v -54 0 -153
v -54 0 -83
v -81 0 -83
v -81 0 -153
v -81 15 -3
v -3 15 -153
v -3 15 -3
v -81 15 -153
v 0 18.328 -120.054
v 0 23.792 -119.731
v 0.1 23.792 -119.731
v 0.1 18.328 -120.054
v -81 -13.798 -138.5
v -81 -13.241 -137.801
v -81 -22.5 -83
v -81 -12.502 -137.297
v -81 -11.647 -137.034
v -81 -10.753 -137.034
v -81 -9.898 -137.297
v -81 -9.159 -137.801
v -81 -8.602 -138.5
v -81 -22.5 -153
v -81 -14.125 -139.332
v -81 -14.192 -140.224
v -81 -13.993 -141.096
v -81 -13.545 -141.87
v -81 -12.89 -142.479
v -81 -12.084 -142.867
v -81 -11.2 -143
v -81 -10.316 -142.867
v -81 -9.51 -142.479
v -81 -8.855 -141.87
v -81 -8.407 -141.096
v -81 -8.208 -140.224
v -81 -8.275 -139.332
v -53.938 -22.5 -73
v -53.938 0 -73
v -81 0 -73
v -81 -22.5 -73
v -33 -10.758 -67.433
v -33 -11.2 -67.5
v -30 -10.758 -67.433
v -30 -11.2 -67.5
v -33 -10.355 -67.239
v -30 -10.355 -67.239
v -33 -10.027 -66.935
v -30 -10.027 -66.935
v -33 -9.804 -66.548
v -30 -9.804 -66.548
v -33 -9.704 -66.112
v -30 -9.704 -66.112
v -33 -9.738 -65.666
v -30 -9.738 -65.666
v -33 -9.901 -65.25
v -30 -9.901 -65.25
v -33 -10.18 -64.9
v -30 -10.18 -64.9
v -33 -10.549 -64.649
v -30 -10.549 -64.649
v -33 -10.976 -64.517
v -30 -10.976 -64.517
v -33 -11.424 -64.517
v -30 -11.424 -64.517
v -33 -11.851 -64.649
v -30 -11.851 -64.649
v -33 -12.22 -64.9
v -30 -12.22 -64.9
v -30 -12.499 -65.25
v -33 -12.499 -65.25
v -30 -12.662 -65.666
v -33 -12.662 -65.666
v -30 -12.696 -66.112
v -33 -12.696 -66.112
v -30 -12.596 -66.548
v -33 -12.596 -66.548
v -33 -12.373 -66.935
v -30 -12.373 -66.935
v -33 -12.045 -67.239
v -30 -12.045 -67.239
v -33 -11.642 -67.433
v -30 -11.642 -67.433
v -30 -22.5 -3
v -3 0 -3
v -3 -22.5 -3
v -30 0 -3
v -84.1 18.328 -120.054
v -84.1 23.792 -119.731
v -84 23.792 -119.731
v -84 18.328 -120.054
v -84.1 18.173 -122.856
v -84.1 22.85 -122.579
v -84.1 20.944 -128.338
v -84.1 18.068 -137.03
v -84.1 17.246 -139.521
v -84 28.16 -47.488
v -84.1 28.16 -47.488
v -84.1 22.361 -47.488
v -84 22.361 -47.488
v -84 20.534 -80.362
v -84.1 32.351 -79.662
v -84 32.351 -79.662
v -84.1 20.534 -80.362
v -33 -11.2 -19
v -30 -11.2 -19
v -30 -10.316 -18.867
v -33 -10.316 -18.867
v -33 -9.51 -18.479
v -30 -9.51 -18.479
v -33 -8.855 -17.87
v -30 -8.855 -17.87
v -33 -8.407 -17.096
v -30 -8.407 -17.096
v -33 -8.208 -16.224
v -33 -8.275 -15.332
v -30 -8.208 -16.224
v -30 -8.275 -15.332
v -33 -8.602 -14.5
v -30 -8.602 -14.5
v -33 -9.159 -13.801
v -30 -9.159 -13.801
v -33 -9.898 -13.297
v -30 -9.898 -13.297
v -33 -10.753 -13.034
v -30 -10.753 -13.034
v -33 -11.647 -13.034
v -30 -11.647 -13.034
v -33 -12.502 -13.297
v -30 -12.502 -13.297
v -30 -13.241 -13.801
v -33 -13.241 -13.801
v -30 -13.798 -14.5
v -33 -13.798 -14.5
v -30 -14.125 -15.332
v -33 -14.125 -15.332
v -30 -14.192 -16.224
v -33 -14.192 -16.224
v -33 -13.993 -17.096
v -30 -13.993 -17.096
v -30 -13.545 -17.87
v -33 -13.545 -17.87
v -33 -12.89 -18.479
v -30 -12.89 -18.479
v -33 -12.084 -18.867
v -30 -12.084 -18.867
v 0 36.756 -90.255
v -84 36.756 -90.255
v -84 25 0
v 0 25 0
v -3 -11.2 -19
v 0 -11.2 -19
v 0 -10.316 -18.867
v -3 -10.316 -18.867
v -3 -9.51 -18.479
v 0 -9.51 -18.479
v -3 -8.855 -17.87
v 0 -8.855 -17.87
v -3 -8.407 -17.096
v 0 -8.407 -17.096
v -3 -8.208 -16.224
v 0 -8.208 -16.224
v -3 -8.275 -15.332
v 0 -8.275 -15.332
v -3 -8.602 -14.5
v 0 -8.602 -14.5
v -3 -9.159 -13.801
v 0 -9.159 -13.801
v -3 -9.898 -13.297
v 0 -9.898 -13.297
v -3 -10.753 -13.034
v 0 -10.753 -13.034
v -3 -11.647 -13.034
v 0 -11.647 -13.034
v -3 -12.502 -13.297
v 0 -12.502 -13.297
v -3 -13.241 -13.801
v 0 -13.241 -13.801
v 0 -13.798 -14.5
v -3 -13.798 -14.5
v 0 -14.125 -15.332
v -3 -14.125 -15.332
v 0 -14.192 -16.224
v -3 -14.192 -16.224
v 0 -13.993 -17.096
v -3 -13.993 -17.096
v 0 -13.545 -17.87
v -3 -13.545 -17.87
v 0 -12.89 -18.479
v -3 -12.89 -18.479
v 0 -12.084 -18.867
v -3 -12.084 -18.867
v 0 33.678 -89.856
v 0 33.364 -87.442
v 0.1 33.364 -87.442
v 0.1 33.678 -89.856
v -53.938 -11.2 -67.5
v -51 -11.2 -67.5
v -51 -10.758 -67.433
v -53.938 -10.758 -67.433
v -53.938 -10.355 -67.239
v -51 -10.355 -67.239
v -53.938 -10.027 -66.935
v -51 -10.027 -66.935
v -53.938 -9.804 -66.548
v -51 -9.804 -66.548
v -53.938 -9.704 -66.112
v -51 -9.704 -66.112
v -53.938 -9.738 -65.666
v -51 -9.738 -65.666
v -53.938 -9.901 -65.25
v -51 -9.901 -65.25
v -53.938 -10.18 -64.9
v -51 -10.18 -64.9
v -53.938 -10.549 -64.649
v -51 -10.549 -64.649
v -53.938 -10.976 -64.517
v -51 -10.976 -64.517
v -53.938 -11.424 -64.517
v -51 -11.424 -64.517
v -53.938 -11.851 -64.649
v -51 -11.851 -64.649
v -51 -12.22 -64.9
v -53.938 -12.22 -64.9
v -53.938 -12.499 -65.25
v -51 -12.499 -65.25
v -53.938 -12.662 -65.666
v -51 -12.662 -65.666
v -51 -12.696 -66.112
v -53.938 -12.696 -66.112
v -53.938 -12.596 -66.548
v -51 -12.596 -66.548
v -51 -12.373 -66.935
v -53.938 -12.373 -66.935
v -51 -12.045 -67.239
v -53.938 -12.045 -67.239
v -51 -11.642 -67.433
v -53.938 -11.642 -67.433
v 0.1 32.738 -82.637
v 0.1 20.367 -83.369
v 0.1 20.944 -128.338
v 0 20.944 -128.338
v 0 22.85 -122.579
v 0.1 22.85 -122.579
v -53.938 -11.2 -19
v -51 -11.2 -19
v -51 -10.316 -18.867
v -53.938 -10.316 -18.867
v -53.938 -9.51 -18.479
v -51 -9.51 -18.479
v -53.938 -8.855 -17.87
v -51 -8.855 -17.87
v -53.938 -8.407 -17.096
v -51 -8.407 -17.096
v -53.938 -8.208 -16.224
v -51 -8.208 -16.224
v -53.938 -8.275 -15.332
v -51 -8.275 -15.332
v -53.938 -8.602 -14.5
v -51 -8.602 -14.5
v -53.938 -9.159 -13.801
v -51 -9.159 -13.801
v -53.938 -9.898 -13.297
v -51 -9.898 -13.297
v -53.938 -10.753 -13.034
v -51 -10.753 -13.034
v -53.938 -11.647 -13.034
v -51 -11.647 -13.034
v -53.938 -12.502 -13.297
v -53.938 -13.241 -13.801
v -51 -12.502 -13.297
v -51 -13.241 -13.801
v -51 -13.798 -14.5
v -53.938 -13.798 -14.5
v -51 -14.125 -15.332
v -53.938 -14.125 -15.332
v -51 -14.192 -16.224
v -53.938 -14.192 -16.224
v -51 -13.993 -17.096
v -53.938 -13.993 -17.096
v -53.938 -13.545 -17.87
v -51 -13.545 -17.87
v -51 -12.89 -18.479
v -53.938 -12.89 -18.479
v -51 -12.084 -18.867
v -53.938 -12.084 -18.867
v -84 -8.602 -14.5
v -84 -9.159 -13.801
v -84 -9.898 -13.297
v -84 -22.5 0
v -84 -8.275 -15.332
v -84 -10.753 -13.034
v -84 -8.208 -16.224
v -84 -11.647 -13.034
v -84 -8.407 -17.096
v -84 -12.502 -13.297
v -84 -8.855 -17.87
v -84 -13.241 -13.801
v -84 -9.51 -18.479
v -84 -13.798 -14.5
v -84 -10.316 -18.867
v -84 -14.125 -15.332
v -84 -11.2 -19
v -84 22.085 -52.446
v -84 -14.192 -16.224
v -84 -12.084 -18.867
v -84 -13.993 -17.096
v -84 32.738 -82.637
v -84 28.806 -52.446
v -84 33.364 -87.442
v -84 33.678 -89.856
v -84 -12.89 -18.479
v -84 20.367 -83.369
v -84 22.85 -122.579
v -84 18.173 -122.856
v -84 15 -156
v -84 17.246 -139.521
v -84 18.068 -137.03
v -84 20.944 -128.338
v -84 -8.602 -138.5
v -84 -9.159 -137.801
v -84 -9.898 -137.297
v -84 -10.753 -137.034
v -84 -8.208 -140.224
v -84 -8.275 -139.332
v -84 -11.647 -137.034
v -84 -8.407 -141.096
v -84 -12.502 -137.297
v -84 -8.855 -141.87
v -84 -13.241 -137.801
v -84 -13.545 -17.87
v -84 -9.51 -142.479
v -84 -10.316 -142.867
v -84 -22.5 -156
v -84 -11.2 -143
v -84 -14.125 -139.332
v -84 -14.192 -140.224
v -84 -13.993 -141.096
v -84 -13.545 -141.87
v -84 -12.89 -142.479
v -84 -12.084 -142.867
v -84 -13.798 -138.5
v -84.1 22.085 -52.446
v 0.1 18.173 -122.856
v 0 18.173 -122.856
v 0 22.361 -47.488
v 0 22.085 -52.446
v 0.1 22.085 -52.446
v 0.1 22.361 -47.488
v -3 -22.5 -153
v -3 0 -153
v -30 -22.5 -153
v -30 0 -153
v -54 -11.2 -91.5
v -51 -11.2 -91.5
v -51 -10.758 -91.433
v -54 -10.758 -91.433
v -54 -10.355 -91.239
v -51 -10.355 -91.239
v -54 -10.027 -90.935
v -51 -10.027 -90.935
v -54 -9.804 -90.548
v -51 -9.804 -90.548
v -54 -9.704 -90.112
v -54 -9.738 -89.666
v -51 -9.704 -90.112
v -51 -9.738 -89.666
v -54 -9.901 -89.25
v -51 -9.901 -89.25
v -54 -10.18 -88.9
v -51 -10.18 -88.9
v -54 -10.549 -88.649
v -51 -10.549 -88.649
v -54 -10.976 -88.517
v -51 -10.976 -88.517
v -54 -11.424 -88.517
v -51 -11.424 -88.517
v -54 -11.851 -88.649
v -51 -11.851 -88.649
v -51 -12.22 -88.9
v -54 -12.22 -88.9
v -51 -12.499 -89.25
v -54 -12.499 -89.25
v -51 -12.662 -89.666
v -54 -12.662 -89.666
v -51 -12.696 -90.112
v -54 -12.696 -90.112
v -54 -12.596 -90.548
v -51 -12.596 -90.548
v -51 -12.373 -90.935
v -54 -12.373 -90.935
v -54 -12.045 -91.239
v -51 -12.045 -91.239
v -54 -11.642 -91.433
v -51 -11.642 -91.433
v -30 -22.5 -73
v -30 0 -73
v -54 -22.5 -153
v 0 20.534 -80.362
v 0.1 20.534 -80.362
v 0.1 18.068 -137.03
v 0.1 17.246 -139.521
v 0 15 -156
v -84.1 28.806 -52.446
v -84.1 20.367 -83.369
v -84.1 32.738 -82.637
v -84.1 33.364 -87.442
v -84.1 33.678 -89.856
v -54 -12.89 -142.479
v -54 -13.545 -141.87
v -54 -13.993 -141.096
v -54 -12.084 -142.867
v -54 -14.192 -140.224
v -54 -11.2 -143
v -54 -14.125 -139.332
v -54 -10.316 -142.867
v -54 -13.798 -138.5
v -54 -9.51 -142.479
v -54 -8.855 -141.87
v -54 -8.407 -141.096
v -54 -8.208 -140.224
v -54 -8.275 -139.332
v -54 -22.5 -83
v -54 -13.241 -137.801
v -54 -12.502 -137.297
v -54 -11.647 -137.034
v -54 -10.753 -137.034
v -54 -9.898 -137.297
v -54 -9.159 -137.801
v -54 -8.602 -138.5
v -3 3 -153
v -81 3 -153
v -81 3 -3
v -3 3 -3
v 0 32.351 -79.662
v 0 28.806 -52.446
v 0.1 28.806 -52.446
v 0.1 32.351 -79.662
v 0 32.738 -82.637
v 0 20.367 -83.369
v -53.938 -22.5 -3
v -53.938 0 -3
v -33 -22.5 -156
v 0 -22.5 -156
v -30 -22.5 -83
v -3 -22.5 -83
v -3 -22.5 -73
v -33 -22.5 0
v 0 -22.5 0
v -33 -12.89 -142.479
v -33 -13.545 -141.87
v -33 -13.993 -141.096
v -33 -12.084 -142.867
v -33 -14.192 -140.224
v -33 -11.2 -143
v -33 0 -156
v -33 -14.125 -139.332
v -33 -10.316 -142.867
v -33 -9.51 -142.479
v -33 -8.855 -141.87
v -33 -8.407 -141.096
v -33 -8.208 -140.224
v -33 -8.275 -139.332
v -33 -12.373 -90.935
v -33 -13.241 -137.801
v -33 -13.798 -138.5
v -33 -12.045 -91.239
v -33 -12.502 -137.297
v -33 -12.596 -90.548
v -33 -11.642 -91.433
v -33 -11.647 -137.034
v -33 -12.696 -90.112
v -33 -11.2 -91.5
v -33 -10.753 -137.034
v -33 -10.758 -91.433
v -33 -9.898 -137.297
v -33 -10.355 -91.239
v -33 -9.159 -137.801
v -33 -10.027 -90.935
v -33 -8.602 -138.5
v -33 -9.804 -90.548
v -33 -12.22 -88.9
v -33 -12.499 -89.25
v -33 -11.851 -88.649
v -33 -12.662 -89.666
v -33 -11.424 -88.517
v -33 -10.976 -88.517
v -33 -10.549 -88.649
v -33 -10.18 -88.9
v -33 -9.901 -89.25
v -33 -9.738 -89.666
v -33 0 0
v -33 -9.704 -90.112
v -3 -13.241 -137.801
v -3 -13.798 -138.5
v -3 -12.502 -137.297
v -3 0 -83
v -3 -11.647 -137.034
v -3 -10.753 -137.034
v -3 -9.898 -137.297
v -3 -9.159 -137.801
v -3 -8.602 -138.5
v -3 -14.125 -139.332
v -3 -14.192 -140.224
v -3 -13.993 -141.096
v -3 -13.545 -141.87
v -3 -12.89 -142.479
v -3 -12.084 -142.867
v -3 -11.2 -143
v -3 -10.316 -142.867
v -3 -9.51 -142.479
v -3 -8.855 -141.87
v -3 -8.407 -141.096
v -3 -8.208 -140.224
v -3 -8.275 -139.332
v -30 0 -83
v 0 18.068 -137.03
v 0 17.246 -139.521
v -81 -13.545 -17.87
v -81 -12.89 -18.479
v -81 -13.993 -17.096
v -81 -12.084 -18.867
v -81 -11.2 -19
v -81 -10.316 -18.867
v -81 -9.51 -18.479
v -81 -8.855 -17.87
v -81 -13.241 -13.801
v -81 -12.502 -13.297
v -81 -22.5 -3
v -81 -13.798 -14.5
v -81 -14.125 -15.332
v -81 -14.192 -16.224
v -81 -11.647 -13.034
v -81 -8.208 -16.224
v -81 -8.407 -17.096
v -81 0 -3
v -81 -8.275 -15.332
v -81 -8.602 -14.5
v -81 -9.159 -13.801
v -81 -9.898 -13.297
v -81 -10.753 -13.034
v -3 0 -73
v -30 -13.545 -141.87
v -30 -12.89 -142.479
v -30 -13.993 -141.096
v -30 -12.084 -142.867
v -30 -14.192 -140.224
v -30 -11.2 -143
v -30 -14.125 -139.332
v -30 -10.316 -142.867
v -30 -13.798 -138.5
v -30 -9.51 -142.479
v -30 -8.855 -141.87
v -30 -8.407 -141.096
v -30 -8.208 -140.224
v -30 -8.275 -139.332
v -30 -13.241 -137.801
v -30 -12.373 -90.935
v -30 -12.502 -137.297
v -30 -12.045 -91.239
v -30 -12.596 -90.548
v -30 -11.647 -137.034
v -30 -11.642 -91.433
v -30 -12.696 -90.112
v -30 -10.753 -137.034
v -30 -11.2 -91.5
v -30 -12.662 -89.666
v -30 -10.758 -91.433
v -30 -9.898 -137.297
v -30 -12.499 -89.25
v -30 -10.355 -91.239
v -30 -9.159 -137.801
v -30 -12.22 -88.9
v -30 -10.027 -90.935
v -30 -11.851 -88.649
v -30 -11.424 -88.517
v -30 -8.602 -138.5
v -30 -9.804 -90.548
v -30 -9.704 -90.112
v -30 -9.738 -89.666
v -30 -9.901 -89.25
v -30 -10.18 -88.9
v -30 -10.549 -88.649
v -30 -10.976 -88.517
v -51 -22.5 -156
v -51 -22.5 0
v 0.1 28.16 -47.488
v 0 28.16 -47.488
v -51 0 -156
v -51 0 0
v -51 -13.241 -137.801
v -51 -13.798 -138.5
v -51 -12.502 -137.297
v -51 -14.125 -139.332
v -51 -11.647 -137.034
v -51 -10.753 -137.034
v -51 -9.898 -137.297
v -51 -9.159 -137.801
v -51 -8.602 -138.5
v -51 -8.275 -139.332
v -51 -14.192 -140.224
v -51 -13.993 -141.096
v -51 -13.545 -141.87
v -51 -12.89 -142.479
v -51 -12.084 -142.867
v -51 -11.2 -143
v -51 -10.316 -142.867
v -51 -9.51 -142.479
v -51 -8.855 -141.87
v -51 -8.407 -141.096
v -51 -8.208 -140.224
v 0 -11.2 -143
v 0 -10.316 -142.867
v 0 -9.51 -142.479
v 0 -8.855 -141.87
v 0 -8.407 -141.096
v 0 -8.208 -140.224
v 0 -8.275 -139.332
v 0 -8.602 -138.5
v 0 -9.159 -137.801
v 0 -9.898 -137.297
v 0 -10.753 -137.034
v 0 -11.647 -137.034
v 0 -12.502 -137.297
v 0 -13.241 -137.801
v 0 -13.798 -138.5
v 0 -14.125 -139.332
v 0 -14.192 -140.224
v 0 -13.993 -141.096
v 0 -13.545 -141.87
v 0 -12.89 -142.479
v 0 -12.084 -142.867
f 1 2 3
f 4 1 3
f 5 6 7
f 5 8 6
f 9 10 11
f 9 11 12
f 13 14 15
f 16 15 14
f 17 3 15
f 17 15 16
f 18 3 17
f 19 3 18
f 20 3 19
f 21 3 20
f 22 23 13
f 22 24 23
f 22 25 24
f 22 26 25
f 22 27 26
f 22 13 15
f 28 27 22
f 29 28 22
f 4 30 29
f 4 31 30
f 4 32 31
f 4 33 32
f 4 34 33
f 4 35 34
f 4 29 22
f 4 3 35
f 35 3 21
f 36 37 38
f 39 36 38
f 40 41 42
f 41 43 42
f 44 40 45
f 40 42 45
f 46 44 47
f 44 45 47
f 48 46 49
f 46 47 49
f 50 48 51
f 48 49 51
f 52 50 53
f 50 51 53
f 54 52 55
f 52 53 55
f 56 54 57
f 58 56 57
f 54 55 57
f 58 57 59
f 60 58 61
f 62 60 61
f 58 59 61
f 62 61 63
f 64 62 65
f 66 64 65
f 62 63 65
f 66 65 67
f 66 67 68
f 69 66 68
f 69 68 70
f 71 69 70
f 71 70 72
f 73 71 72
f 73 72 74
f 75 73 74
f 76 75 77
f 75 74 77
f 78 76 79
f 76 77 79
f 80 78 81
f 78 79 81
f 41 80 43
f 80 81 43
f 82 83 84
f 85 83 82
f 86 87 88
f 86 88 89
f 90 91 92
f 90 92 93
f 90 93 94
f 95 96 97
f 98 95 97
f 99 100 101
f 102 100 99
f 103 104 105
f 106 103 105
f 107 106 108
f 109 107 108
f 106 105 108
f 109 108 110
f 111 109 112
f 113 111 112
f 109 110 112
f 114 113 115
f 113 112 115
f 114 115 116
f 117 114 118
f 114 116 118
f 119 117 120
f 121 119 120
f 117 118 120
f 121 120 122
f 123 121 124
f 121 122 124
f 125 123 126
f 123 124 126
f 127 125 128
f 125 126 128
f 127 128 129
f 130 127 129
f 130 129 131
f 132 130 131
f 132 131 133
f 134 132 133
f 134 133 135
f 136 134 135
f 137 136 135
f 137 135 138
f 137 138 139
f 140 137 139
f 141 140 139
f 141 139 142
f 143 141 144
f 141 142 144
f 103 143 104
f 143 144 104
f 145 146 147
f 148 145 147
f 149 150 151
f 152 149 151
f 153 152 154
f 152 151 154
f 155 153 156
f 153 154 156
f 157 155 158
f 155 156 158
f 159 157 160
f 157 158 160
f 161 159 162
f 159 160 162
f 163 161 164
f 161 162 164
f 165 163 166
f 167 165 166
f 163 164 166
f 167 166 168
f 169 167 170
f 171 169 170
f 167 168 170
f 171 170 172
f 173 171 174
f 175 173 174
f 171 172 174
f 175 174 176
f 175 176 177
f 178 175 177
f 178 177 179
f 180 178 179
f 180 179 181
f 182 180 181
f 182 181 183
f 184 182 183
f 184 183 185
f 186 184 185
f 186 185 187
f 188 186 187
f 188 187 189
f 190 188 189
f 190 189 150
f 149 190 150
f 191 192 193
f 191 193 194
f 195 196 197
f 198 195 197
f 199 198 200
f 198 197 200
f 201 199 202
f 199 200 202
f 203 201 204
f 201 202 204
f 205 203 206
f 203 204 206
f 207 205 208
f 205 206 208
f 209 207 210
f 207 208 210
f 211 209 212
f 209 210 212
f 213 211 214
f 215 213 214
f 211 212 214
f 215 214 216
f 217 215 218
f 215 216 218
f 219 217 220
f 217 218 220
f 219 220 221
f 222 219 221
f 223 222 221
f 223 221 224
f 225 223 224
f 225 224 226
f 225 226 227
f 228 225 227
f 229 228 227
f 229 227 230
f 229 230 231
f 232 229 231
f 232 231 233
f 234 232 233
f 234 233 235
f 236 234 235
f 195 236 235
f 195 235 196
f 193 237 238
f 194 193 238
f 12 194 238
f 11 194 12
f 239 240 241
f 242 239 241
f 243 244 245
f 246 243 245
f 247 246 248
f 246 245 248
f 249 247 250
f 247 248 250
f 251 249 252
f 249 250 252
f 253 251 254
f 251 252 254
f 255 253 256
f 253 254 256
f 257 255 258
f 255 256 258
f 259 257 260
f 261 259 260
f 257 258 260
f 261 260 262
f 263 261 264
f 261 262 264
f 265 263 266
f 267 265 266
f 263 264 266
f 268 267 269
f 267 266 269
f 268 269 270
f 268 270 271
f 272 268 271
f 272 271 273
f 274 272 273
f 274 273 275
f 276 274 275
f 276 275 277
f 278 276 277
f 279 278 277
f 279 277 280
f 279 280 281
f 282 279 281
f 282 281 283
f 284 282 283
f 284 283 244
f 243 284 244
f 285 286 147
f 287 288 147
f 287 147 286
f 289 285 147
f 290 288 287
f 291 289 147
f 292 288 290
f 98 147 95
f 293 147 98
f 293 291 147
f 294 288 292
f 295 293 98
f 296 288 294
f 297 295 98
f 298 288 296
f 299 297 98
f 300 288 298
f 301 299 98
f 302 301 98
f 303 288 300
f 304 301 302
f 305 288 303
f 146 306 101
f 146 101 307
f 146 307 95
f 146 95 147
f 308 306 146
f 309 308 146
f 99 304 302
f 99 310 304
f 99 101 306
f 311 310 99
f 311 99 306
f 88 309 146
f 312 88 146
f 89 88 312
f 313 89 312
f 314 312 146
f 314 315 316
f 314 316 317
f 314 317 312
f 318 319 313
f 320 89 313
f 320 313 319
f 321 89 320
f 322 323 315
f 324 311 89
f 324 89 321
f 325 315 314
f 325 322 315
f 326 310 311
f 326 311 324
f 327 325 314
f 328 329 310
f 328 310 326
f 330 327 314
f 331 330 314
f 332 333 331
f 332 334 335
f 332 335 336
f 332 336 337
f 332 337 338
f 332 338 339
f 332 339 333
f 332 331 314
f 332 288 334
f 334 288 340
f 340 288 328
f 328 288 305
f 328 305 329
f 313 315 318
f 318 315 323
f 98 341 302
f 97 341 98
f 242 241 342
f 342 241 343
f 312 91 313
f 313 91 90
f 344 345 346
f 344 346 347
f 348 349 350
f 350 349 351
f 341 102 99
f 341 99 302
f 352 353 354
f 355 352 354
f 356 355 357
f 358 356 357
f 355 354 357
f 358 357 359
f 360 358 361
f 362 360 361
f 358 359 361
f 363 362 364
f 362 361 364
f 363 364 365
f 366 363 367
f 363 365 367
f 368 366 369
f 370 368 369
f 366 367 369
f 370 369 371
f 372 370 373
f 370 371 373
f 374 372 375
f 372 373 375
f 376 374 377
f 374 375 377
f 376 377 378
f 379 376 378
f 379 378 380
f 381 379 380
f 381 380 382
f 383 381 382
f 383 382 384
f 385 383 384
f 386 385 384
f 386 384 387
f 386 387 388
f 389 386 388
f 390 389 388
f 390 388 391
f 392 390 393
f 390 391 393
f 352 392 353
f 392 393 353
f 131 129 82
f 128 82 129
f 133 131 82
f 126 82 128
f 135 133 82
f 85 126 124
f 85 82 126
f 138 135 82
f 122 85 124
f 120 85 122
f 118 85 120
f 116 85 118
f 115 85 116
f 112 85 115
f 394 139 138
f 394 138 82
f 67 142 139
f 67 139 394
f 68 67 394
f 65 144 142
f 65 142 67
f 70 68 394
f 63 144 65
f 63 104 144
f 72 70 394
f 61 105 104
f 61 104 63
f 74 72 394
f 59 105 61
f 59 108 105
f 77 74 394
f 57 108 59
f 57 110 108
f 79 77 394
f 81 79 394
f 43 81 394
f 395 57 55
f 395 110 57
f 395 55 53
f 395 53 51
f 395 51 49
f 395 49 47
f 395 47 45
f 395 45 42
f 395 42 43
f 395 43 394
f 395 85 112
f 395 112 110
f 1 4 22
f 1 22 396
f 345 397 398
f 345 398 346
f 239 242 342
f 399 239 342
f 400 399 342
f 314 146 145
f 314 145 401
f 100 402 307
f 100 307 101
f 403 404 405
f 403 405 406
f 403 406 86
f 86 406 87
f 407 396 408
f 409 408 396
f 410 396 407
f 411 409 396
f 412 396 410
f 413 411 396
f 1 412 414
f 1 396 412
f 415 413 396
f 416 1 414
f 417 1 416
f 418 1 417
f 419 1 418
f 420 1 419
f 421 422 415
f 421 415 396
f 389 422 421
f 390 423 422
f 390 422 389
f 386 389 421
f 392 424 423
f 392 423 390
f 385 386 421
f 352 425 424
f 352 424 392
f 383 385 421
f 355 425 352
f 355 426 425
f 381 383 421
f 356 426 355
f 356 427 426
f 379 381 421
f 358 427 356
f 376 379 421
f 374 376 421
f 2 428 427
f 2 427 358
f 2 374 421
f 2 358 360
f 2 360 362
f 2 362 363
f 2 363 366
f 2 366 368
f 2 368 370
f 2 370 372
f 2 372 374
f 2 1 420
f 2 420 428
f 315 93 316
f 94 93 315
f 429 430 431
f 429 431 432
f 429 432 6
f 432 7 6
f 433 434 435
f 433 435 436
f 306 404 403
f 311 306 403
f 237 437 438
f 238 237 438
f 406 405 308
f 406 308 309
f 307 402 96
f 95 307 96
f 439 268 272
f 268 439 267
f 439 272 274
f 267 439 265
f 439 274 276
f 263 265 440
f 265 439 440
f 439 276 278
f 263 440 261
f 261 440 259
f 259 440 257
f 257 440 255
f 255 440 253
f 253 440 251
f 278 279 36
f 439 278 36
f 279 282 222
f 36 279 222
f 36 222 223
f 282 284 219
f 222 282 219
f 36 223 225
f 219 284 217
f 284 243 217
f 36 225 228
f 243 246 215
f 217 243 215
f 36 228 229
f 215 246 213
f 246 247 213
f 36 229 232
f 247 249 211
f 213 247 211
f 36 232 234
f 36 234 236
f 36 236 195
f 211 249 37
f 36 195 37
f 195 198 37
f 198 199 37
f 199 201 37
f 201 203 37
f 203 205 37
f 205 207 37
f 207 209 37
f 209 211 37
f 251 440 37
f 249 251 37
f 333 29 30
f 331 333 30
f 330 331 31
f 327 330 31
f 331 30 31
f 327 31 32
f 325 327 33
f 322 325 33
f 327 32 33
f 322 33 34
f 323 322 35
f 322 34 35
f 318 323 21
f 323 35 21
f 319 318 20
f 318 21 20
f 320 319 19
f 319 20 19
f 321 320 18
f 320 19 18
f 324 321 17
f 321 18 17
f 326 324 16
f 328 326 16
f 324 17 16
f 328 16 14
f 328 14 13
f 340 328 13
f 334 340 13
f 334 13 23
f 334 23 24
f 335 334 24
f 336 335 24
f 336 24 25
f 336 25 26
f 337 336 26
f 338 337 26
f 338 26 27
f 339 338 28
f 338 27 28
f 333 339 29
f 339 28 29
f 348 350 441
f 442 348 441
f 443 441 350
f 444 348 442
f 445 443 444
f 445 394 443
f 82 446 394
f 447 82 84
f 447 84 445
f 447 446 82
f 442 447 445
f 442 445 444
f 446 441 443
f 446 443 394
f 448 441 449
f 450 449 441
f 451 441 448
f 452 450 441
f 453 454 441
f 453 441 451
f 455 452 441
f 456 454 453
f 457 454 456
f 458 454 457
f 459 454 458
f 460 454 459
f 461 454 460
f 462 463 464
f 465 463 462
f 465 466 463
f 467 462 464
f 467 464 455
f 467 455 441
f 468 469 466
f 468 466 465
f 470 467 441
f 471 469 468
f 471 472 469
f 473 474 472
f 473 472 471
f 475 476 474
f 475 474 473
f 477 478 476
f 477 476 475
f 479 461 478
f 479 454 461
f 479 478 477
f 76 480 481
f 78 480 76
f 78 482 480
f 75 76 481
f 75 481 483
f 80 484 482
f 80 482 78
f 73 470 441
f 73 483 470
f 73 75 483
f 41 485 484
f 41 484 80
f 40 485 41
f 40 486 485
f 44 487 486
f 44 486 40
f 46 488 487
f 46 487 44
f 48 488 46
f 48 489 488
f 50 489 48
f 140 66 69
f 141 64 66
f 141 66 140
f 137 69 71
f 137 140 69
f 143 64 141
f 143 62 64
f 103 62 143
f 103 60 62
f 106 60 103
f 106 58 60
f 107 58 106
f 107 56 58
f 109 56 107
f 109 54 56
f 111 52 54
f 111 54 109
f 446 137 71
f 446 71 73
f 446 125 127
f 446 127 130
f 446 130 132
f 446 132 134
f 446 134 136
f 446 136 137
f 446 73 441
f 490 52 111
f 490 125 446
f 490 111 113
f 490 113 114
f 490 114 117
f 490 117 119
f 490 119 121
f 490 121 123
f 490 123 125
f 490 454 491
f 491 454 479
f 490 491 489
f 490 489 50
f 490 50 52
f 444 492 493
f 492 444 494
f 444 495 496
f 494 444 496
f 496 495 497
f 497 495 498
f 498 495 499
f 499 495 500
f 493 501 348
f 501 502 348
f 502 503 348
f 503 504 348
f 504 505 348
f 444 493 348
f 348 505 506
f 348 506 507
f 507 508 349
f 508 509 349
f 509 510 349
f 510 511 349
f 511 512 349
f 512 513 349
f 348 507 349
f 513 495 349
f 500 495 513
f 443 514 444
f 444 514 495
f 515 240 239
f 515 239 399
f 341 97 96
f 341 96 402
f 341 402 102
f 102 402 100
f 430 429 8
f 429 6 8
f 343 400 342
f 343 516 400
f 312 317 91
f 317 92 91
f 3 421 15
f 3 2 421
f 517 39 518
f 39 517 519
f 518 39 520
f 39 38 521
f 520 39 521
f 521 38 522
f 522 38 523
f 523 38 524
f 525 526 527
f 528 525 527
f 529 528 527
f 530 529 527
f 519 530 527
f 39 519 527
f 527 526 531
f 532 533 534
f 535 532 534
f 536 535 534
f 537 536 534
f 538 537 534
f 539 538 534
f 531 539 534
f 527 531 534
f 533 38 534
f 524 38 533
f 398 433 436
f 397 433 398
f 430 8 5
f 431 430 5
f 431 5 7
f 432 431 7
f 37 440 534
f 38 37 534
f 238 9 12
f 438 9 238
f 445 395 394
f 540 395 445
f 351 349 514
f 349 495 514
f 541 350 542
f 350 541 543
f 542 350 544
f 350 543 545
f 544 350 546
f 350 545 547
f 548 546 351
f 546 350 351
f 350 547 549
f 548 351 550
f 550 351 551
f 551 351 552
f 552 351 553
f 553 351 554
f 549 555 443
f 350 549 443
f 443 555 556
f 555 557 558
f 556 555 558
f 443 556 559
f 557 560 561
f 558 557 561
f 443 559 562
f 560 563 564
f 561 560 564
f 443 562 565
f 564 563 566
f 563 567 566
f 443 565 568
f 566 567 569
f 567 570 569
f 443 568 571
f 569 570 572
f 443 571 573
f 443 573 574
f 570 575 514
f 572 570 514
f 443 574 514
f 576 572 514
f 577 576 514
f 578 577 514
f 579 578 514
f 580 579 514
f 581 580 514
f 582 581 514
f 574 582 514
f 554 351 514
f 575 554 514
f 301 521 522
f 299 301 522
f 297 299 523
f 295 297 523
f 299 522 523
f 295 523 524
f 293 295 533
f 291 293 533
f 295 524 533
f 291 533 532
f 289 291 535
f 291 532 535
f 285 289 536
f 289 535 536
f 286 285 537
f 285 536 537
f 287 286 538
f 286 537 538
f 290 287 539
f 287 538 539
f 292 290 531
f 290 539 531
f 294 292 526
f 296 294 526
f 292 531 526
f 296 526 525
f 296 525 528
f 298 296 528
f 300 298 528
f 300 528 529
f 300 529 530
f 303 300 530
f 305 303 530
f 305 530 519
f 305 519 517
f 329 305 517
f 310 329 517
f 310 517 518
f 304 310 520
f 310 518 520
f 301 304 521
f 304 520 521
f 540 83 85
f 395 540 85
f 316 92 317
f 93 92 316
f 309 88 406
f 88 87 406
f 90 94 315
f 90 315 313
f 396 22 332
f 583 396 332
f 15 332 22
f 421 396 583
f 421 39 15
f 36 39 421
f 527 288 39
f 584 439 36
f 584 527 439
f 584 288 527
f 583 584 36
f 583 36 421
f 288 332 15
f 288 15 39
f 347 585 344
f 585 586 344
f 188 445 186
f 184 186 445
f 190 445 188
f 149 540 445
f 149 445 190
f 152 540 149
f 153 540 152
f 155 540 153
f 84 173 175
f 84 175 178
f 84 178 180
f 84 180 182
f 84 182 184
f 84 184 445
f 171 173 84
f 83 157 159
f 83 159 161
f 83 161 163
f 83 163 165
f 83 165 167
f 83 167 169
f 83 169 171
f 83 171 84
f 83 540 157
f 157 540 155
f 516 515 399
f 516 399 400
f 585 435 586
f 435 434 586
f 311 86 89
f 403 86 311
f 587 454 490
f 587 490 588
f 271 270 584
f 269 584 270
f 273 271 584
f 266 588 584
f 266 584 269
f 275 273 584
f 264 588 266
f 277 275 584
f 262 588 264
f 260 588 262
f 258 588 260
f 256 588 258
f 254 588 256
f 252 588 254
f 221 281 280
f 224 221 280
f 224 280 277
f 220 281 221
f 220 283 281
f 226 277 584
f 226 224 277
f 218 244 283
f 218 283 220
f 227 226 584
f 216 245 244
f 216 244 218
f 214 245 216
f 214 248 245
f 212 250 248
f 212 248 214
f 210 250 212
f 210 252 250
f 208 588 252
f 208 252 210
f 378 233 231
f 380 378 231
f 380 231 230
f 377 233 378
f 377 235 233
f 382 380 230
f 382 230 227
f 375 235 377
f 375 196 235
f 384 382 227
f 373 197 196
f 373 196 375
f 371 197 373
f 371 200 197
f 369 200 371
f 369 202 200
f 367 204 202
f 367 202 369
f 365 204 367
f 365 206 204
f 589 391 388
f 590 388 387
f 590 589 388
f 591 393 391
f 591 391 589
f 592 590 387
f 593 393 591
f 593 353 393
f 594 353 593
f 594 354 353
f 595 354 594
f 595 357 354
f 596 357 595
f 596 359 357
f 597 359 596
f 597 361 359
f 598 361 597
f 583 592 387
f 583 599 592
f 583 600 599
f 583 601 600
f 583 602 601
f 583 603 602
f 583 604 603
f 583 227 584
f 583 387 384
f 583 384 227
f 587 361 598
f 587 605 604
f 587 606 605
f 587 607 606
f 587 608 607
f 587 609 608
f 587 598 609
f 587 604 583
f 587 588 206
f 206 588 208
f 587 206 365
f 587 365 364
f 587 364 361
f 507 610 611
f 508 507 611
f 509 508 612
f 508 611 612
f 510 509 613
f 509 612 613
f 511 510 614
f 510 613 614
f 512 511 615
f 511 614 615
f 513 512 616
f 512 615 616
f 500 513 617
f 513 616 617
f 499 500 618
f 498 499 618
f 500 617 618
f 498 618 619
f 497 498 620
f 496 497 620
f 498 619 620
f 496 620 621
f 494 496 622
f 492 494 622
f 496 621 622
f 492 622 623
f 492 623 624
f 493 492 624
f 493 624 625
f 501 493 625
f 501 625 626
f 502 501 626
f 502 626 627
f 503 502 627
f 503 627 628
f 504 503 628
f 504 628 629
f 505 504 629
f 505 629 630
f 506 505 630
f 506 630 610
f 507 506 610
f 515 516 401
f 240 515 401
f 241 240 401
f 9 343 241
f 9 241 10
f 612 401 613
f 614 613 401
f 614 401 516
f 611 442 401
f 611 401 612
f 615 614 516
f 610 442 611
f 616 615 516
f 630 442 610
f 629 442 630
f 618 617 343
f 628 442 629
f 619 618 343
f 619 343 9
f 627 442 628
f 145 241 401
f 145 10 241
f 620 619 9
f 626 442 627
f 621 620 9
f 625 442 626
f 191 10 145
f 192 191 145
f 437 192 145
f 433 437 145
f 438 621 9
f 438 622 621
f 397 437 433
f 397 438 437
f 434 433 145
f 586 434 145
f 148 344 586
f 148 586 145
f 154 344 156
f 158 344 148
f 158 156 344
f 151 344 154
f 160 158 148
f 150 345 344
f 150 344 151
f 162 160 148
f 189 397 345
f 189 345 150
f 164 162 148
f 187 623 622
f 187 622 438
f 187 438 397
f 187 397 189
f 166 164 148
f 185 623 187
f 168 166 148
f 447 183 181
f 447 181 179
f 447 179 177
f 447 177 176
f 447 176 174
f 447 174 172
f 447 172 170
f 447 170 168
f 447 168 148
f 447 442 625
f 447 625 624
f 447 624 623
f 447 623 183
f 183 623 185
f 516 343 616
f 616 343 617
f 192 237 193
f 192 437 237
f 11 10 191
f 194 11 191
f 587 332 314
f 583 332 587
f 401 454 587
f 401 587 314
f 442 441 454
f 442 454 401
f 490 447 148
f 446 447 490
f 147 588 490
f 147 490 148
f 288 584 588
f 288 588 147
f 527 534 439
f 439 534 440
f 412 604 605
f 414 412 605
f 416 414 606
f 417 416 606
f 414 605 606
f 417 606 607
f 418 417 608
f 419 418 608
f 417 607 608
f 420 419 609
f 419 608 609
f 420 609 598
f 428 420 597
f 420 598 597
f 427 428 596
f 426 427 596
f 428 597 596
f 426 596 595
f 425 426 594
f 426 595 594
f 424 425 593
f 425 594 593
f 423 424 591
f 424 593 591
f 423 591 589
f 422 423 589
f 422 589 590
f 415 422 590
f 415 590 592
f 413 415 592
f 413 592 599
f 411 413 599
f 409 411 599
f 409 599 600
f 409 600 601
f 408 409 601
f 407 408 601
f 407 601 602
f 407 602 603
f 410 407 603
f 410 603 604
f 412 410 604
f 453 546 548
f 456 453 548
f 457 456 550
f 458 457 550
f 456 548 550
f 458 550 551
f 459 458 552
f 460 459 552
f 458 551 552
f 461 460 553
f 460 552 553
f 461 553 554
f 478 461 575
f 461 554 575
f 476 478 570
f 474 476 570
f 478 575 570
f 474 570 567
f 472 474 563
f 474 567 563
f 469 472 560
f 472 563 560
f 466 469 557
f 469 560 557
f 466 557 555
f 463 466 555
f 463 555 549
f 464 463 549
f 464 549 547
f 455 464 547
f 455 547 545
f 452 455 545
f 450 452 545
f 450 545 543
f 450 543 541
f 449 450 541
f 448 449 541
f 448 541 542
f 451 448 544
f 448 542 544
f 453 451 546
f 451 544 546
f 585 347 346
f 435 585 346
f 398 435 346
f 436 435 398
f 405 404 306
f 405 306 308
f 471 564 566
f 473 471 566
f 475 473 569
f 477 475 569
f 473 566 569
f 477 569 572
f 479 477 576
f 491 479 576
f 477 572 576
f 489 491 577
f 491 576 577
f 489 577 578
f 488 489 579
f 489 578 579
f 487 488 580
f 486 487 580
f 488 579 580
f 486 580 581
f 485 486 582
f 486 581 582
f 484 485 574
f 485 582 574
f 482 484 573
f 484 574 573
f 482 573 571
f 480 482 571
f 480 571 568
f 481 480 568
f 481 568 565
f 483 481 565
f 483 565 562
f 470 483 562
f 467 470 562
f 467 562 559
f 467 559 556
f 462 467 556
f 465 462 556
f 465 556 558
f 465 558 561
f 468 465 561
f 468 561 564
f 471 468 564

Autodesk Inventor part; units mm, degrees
ref_plane "YZ Plane" through (0, 0, 0) normal (1, 0, 0) x (0, 1, 0)
ref_plane "XZ Plane" through (0, 0, 0) normal (0, 1, 0) x (-1, 0, 0)
ref_plane "XY Plane" through (0, 0, 0) normal (0, 0, 1) x (1, 0, 0)
sketch "Sketch1" plane through (0, 0, 0) normal (0, 1, 0) x (-1, 0, 0)
  line L0 (0, 0) -> (84, 0)
  line L1 (84, 0) -> (84, -156)
  line L2 (84, -156) -> (0, -156)
  line L3 (0, -156) -> (0, 0)
  line L4 (84, 0) -> (84, -3)
  line L5 (84, -3) -> (81, -3) construction
  line L6 (0, -156) -> (0, -153)
  line L7 (0, -153) -> (3, -153) construction
  line L8 (81, -3) -> (3, -3)
  line L9 (3, -3) -> (3, -153)
  line L10 (3, -153) -> (81, -153)
  line L11 (81, -153) -> (81, -3)
  dimension "d0" = 84
  dimension "d1" = 156
  dimension "d2" = 3
  dimension "d3" = 3
  dimension "d4" = 3
  dimension "d5" = 3
extrude "Extrusion1" add sketch "Sketch1" along normal blind 15 contours L0 L1 L2 L3 | L11 L10 L9 L8
sketch "Sketch2" plane through (0, 15, 0) normal (0, 1, 0) x (1, 0, 0)
  line L0 (-84, 156) -> (-84, 0) projected
  line L1 (-84, 0) -> (-84, 3)
  line L2 (-84, 3) -> (-81, 3) construction
  line L3 (0, 0) -> (0, 156) projected
  line L4 (0, 156) -> (0, 153)
  line L5 (0, 153) -> (-3, 153) construction
  line L6 (-81, 3) -> (-3, 3)
  line L7 (-3, 3) -> (-3, 153)
  line L8 (-3, 153) -> (-81, 153)
  line L9 (-81, 153) -> (-81, 3)
  dimension "d8" = 3
  dimension "d9" = 3
  dimension "d10" = 3
  dimension "d11" = 3
extrude "Extrusion2" cut sketch "Sketch2" against normal blind 12
sketch "Sketch15" plane through (-81, 3, -3) normal (1, 0, 0) x (0, 0, -1)
  line L0 (87.2546, 33.7556) -> (153, 12)
  line L1 (153, 12) -> (150, 12)
  line L2 (153, 12) -> (-3, 12)
  line L3 (-3, 12) -> (153, 12) projected
  line L4 (-3, 12) -> (-3, 22)
  line L5 (87.2546, 33.7556) -> (-3, 22)
  dimension "d125" = 10
extrude "Extrusion12" add sketch "Sketch15" along normal blind 81 and the other way blind 3
sketch "Sketch16" plane through (0, 0, 0) normal (0, -1, 0) x (1, 0, 0)
  line L0 (0, -156) -> (-3, -156)
  line L1 (0, -153) -> (0, -156)
  line L2 (-3, -153) -> (-30, -153)
  line L3 (-30, -153) -> (-30, -83)
  line L4 (-30, -83) -> (-3, -83)
  line L5 (-3, -83) -> (-3, -153)
  line L6 (-81, -153) -> (-54, -153)
  line L7 (-54, -153) -> (-54, -83)
  line L8 (-54, -83) -> (-81, -83)
  line L9 (-81, -83) -> (-81, -153)
  line L10 (-3, -3) -> (-30, -3)
  line L11 (-30, -3) -> (-30, -73)
  line L12 (-30, -73) -> (-3, -73)
  line L13 (-3, -73) -> (-3, -3)
  line L14 (-81, -3) -> (-53.9385, -3)
  line L15 (-53.9385, -3) -> (-53.9385, -72.9998)
  line L16 (-53.9385, -72.9998) -> (-81, -72.9998)
  line L17 (-81, -72.9998) -> (-81, -3)
  line L18 (-33, -83) -> (-33, -80)
  line L19 (-33, -73) -> (-33, -76)
  line L20 (0, -156) -> (-33, -156)
  line L21 (-33, -156) -> (-33, -80)
  line L22 (0, -80) -> (0, -156)
  line L23 (-84, -156) -> (-51, -156)
  line L24 (-84, -80) -> (-84, -156)
  line L25 (0, 0) -> (-33, 0)
  line L26 (-33, 0) -> (-33, -76)
  line L27 (0, -76) -> (0, 0)
  line L28 (-84, 0) -> (-51, 0)
  line L29 (-51, 0) -> (-51, -72.9998)
  line L30 (-84, -76) -> (-84, 0)
  line L31 (-33, -80) -> (-33, -76)
  line L32 (0, -80) -> (0, -76)
  line L33 (0, -90.2546) -> (0, 0) projected
  line L34 (-51, -156) -> (-51, -83)
  line L35 (-51, -83) -> (-51, -72.9998)
  line L36 (-84, -80) -> (-84, -76)
  line L37 (-84, -156) -> (-84, 0) projected
extrude "Extrusion13" add sketch "Sketch16" along normal blind 22.5
sketch "Sketch17" plane through (0, -22.5, 0) normal (1, 0, 0) x (0, 0, -1)
  line L0 (156, 22.5) -> (0, 22.5) projected
  line L1 (0, 22.5) -> (16, 22.5)
  line L2 (16, 22.5) -> (16, 11.3)
  line L3 (156, 22.5) -> (156, 0) projected
  line L4 (156, 22.5) -> (140, 22.5)
  line L5 (140, 22.5) -> (140, 11.3)
  circle A0 centre (140, 11.3) radius 3
  circle A1 centre (16, 11.3) radius 3
  dimension "d152" = 16
  dimension "d153" = 11.2
  dimension "d154" = 16
  dimension "d155" = 11.2
  dimension "d156" = 6
  dimension "d157" = 6
extrude "Extrusion14" cut sketch "Sketch17" against normal blind 104.25
sketch "Sketch18" plane through (-30, 0, -3) normal (1, 0, 0) x (0, 0, -1)
  circle A0 centre (13, -11.2) radius 3 projected
  line L0 (13, -11.2) -> (63, -11.2)
  circle A1 centre (63, -11.2) radius 1.5
  circle A2 centre (137, -11.2) radius 3 projected
  line L1 (137, -11.2) -> (87, -11.2)
  circle A3 centre (87, -11.2) radius 1.5
  point P0 (-3, 0)
  dimension "d160" = 50
  dimension "d161" = 3
  dimension "d162" = 50
  dimension "d163" = 3
extrude "Extrusion15" cut sketch "Sketch18" against normal blind 35 contours A1 | A3
sketch "Sketch19" plane through (0, -22.5, 0) normal (1, 0, 0) x (0, 0, -1)
  line L0 (24.5867, 50.7024) -> (27.5867, 50.7024) construction
  line L1 (52.4457, 51.3057) -> (87.4417, 55.8638)
  line L2 (87.4417, 55.8638) -> (89.8555, 56.1782)
  line L3 (128.3377, 43.444) -> (89.8555, 56.1782)
  line L4 (128.3377, 43.444) -> (137.0302, 40.5676)
  line L5 (3, 37.5) -> (153, 37.5) construction
  line L6 (136.0152, 37.5) -> (139.0152, 37.5) construction
  line L7 (138.3236, 37.5) -> (141.3236, 37.5) construction
  line L8 (137.0302, 40.5676) -> (139.5212, 39.7465)
  line L9 (0, 47.5) -> (0, 0) construction
  line L10 (139.5212, 39.7465) -> (52.4457, 44.5852)
  line L11 (82.6373, 55.2381) -> (79.6624, 54.8506) construction
  line L12 (82.6373, 55.2381) -> (83.3756, 42.7599)
  line L13 (82.6373, 55.2381) -> (79.6624, 54.8506)
  line L14 (79.6624, 54.8506) -> (80.3616, 43.0339)
  line L15 (119.7308, 46.2922) -> (120.0541, 40.8283)
  line L16 (122.5789, 45.3497) -> (122.8556, 40.6726)
  line L17 (52.4457, 51.3057) -> (47.4876, 50.6599)
  line L18 (47.4876, 50.6599) -> (47.4876, 44.8607)
  line L19 (52.4457, 44.5852) -> (47.4876, 44.8607)
  point P0 (0, 22.5)
  point P1 (83.3692, 42.8668)
  dimension "d178" = 3
  dimension "d180" = 3
  dimension "d182" = 3
  dimension "d183" = 3
  dimension "d184" = 5
extrude "Extrusion17" cut sketch "Sketch19" against normal up to surface (84 mm away) contours L1 L14 L10 L19 L18 L17 | L1 L2 L3 L15 L10 L12 | L16 L3 L4 L8 L10
extrude "Extrusion18" add sketch "Sketch19" along normal blind 0.1 and the other way blind 84.1 contours L1 L14 L10 L19 L18 L17 | L1 L2 L3 L15 L10 L12 | L16 L3 L4 L8 L10
properties part number "prototype 2"
